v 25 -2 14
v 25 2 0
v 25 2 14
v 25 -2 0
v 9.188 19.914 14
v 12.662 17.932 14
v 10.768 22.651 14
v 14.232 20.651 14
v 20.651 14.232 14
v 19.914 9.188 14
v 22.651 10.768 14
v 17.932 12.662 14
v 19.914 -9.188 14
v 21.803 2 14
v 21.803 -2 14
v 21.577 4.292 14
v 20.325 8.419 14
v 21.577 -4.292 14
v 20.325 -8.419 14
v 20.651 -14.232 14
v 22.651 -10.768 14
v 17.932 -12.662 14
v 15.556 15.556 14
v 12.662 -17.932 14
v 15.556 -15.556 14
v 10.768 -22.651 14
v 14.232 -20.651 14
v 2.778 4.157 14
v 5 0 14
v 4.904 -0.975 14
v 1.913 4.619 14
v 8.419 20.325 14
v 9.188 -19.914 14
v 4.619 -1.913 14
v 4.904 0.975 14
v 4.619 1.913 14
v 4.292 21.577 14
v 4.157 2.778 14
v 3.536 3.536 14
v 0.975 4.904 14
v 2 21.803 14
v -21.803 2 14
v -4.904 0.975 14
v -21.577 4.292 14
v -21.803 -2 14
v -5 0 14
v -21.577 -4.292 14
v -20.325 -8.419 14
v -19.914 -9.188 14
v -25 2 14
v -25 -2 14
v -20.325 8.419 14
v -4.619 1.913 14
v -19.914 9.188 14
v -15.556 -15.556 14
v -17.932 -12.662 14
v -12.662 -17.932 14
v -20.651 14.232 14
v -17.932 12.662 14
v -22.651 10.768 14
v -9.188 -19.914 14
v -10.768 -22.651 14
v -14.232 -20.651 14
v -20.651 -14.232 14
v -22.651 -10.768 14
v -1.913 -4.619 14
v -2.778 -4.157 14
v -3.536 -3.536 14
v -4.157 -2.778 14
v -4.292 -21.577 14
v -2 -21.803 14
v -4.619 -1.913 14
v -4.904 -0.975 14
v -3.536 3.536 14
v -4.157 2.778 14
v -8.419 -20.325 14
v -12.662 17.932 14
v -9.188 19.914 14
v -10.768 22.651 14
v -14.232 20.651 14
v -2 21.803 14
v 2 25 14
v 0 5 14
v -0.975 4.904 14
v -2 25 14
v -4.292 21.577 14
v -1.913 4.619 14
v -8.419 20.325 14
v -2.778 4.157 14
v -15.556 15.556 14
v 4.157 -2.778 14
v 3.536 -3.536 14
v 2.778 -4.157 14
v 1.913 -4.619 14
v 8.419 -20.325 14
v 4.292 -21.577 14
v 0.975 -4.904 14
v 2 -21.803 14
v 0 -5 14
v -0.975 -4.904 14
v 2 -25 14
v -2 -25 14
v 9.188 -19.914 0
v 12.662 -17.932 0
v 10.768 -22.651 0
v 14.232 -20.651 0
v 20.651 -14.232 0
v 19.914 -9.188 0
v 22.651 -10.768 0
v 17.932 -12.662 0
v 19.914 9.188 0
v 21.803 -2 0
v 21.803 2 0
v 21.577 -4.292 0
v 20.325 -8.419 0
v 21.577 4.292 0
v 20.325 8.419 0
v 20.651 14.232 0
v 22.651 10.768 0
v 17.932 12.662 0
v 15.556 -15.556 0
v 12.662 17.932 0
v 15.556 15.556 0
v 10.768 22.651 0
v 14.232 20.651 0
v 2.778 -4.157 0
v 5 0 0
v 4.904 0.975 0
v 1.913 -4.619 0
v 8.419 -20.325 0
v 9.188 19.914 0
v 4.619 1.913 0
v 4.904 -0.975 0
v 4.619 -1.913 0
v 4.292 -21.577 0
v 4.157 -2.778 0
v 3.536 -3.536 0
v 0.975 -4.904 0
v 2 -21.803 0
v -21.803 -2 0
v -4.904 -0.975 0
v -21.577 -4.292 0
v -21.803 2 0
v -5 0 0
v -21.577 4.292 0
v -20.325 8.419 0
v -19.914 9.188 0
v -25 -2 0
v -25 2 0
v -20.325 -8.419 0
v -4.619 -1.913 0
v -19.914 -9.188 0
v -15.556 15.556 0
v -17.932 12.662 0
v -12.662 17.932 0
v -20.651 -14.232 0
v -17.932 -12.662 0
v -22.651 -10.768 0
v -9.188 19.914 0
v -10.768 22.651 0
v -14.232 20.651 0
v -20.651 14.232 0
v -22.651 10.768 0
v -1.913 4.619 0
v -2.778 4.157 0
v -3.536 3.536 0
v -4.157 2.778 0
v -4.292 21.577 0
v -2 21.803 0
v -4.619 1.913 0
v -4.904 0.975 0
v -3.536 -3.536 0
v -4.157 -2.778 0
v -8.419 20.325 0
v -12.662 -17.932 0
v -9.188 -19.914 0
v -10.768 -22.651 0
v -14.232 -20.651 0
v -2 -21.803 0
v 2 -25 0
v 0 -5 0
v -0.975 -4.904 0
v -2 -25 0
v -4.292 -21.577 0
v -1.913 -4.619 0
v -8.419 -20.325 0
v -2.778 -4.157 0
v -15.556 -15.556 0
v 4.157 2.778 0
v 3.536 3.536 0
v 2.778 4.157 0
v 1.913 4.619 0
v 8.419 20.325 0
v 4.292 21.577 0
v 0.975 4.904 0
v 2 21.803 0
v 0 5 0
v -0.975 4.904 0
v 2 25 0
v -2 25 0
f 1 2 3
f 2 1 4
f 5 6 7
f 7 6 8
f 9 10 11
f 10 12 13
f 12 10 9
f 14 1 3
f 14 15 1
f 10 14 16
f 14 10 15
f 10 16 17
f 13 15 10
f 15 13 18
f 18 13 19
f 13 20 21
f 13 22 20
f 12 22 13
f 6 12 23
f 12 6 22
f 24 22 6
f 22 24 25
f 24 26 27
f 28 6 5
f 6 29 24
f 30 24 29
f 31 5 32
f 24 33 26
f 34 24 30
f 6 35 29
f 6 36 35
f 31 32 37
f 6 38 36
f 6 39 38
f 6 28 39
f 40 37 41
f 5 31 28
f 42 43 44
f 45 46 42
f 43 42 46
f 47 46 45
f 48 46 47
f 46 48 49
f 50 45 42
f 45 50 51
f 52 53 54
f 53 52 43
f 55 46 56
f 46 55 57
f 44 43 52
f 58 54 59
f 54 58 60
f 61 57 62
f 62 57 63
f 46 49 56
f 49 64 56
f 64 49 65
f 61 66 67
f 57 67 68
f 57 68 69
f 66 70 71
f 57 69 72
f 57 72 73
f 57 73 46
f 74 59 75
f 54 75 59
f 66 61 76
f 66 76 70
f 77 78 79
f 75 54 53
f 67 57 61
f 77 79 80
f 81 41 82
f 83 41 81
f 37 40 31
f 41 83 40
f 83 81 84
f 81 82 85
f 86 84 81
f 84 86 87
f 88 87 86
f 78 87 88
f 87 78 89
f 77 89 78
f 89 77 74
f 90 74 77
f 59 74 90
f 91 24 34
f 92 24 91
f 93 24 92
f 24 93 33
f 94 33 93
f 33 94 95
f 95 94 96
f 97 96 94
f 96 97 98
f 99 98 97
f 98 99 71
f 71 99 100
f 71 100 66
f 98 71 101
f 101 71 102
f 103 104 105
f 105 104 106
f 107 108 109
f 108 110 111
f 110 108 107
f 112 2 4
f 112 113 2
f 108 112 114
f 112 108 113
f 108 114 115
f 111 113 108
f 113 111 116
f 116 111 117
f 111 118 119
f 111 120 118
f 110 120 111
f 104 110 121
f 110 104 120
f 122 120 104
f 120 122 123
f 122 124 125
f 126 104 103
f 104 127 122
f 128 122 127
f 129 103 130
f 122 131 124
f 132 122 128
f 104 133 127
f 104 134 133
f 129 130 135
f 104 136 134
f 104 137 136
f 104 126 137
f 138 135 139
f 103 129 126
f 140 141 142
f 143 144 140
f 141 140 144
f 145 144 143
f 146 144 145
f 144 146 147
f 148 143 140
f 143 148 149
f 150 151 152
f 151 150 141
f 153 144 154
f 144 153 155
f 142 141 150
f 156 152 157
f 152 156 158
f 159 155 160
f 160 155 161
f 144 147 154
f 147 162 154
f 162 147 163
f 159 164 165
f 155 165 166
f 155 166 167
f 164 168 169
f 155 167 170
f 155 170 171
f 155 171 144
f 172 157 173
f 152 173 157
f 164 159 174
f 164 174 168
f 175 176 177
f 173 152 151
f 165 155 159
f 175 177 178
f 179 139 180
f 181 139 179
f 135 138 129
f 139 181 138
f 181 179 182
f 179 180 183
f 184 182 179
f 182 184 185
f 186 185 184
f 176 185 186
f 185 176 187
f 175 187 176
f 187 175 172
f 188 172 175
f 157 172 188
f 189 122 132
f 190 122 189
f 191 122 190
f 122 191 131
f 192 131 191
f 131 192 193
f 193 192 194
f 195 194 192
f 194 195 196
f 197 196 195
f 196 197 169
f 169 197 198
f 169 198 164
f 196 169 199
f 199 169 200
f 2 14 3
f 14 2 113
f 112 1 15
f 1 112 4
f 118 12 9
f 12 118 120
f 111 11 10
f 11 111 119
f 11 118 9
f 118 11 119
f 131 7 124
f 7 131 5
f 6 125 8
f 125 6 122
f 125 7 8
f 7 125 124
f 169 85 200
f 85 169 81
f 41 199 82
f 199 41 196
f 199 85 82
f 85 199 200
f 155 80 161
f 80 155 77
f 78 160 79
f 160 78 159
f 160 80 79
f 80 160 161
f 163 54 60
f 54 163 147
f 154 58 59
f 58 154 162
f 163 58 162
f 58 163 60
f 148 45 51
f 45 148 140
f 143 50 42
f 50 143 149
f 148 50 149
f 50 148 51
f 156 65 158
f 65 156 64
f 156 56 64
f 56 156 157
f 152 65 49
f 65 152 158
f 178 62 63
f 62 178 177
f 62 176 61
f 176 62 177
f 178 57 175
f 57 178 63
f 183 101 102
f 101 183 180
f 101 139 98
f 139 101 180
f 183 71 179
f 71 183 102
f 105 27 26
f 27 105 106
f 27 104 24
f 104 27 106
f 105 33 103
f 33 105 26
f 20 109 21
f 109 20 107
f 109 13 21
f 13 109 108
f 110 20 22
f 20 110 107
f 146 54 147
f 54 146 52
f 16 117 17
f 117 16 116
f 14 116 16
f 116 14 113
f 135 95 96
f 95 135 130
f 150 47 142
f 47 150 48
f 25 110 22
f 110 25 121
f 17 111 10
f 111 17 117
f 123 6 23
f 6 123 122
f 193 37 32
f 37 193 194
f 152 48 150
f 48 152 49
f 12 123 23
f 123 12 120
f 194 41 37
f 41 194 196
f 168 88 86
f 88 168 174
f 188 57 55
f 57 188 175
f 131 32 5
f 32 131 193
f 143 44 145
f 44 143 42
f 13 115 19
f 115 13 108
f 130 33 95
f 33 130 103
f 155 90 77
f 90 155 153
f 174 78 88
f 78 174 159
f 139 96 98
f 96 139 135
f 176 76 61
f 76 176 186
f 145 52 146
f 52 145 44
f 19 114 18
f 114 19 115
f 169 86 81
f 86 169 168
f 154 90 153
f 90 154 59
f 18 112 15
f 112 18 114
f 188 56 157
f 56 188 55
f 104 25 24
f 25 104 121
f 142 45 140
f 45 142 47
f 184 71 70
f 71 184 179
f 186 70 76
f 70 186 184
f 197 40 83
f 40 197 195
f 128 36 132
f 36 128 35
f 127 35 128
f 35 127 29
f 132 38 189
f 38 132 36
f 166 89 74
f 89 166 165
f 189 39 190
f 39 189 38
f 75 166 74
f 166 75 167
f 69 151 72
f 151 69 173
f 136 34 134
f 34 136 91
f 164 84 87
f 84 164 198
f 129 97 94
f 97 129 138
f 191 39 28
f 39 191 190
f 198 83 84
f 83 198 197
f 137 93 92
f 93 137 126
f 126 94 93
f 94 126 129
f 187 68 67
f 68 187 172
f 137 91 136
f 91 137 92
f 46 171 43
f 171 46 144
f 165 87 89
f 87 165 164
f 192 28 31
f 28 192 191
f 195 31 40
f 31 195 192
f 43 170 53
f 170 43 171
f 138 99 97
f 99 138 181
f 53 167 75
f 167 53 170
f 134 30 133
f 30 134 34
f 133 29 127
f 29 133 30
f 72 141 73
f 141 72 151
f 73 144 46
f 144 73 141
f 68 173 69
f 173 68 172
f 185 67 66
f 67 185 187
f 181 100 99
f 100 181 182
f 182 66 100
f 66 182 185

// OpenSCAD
$fn = 32;

// ----------------------------------------------------------------------
// Spur blank: bored gear blank
// ----------------------------------------------------------------------

// --- parameters (mm) ---
disc_r = 22;              // blank root radius
disc_t = 14;              // blank thickness
n_teeth = 12;             // stub tooth count
tooth_w = 4;              // tooth width at the root
tooth_h = 3;              // tooth height above the root
bore_r = 5;               // central bore radius

out_r = disc_r + tooth_h;  // tip radius
bbox_x = 50.0;  // measured width over the teeth
bbox_y = 50.0;  // measured depth over the teeth

difference() {
union() {
  cylinder(r = disc_r, h = disc_t);
  for (i = [0 : n_teeth - 1])
    rotate([0, 0, i * 360 / n_teeth])
      translate([disc_r - 1, -tooth_w / 2, 0])
        cube([tooth_h + 1, tooth_w, disc_t]);
}
  translate([0, 0, -1]) cylinder(r = bore_r, h = disc_t + 2);
}
